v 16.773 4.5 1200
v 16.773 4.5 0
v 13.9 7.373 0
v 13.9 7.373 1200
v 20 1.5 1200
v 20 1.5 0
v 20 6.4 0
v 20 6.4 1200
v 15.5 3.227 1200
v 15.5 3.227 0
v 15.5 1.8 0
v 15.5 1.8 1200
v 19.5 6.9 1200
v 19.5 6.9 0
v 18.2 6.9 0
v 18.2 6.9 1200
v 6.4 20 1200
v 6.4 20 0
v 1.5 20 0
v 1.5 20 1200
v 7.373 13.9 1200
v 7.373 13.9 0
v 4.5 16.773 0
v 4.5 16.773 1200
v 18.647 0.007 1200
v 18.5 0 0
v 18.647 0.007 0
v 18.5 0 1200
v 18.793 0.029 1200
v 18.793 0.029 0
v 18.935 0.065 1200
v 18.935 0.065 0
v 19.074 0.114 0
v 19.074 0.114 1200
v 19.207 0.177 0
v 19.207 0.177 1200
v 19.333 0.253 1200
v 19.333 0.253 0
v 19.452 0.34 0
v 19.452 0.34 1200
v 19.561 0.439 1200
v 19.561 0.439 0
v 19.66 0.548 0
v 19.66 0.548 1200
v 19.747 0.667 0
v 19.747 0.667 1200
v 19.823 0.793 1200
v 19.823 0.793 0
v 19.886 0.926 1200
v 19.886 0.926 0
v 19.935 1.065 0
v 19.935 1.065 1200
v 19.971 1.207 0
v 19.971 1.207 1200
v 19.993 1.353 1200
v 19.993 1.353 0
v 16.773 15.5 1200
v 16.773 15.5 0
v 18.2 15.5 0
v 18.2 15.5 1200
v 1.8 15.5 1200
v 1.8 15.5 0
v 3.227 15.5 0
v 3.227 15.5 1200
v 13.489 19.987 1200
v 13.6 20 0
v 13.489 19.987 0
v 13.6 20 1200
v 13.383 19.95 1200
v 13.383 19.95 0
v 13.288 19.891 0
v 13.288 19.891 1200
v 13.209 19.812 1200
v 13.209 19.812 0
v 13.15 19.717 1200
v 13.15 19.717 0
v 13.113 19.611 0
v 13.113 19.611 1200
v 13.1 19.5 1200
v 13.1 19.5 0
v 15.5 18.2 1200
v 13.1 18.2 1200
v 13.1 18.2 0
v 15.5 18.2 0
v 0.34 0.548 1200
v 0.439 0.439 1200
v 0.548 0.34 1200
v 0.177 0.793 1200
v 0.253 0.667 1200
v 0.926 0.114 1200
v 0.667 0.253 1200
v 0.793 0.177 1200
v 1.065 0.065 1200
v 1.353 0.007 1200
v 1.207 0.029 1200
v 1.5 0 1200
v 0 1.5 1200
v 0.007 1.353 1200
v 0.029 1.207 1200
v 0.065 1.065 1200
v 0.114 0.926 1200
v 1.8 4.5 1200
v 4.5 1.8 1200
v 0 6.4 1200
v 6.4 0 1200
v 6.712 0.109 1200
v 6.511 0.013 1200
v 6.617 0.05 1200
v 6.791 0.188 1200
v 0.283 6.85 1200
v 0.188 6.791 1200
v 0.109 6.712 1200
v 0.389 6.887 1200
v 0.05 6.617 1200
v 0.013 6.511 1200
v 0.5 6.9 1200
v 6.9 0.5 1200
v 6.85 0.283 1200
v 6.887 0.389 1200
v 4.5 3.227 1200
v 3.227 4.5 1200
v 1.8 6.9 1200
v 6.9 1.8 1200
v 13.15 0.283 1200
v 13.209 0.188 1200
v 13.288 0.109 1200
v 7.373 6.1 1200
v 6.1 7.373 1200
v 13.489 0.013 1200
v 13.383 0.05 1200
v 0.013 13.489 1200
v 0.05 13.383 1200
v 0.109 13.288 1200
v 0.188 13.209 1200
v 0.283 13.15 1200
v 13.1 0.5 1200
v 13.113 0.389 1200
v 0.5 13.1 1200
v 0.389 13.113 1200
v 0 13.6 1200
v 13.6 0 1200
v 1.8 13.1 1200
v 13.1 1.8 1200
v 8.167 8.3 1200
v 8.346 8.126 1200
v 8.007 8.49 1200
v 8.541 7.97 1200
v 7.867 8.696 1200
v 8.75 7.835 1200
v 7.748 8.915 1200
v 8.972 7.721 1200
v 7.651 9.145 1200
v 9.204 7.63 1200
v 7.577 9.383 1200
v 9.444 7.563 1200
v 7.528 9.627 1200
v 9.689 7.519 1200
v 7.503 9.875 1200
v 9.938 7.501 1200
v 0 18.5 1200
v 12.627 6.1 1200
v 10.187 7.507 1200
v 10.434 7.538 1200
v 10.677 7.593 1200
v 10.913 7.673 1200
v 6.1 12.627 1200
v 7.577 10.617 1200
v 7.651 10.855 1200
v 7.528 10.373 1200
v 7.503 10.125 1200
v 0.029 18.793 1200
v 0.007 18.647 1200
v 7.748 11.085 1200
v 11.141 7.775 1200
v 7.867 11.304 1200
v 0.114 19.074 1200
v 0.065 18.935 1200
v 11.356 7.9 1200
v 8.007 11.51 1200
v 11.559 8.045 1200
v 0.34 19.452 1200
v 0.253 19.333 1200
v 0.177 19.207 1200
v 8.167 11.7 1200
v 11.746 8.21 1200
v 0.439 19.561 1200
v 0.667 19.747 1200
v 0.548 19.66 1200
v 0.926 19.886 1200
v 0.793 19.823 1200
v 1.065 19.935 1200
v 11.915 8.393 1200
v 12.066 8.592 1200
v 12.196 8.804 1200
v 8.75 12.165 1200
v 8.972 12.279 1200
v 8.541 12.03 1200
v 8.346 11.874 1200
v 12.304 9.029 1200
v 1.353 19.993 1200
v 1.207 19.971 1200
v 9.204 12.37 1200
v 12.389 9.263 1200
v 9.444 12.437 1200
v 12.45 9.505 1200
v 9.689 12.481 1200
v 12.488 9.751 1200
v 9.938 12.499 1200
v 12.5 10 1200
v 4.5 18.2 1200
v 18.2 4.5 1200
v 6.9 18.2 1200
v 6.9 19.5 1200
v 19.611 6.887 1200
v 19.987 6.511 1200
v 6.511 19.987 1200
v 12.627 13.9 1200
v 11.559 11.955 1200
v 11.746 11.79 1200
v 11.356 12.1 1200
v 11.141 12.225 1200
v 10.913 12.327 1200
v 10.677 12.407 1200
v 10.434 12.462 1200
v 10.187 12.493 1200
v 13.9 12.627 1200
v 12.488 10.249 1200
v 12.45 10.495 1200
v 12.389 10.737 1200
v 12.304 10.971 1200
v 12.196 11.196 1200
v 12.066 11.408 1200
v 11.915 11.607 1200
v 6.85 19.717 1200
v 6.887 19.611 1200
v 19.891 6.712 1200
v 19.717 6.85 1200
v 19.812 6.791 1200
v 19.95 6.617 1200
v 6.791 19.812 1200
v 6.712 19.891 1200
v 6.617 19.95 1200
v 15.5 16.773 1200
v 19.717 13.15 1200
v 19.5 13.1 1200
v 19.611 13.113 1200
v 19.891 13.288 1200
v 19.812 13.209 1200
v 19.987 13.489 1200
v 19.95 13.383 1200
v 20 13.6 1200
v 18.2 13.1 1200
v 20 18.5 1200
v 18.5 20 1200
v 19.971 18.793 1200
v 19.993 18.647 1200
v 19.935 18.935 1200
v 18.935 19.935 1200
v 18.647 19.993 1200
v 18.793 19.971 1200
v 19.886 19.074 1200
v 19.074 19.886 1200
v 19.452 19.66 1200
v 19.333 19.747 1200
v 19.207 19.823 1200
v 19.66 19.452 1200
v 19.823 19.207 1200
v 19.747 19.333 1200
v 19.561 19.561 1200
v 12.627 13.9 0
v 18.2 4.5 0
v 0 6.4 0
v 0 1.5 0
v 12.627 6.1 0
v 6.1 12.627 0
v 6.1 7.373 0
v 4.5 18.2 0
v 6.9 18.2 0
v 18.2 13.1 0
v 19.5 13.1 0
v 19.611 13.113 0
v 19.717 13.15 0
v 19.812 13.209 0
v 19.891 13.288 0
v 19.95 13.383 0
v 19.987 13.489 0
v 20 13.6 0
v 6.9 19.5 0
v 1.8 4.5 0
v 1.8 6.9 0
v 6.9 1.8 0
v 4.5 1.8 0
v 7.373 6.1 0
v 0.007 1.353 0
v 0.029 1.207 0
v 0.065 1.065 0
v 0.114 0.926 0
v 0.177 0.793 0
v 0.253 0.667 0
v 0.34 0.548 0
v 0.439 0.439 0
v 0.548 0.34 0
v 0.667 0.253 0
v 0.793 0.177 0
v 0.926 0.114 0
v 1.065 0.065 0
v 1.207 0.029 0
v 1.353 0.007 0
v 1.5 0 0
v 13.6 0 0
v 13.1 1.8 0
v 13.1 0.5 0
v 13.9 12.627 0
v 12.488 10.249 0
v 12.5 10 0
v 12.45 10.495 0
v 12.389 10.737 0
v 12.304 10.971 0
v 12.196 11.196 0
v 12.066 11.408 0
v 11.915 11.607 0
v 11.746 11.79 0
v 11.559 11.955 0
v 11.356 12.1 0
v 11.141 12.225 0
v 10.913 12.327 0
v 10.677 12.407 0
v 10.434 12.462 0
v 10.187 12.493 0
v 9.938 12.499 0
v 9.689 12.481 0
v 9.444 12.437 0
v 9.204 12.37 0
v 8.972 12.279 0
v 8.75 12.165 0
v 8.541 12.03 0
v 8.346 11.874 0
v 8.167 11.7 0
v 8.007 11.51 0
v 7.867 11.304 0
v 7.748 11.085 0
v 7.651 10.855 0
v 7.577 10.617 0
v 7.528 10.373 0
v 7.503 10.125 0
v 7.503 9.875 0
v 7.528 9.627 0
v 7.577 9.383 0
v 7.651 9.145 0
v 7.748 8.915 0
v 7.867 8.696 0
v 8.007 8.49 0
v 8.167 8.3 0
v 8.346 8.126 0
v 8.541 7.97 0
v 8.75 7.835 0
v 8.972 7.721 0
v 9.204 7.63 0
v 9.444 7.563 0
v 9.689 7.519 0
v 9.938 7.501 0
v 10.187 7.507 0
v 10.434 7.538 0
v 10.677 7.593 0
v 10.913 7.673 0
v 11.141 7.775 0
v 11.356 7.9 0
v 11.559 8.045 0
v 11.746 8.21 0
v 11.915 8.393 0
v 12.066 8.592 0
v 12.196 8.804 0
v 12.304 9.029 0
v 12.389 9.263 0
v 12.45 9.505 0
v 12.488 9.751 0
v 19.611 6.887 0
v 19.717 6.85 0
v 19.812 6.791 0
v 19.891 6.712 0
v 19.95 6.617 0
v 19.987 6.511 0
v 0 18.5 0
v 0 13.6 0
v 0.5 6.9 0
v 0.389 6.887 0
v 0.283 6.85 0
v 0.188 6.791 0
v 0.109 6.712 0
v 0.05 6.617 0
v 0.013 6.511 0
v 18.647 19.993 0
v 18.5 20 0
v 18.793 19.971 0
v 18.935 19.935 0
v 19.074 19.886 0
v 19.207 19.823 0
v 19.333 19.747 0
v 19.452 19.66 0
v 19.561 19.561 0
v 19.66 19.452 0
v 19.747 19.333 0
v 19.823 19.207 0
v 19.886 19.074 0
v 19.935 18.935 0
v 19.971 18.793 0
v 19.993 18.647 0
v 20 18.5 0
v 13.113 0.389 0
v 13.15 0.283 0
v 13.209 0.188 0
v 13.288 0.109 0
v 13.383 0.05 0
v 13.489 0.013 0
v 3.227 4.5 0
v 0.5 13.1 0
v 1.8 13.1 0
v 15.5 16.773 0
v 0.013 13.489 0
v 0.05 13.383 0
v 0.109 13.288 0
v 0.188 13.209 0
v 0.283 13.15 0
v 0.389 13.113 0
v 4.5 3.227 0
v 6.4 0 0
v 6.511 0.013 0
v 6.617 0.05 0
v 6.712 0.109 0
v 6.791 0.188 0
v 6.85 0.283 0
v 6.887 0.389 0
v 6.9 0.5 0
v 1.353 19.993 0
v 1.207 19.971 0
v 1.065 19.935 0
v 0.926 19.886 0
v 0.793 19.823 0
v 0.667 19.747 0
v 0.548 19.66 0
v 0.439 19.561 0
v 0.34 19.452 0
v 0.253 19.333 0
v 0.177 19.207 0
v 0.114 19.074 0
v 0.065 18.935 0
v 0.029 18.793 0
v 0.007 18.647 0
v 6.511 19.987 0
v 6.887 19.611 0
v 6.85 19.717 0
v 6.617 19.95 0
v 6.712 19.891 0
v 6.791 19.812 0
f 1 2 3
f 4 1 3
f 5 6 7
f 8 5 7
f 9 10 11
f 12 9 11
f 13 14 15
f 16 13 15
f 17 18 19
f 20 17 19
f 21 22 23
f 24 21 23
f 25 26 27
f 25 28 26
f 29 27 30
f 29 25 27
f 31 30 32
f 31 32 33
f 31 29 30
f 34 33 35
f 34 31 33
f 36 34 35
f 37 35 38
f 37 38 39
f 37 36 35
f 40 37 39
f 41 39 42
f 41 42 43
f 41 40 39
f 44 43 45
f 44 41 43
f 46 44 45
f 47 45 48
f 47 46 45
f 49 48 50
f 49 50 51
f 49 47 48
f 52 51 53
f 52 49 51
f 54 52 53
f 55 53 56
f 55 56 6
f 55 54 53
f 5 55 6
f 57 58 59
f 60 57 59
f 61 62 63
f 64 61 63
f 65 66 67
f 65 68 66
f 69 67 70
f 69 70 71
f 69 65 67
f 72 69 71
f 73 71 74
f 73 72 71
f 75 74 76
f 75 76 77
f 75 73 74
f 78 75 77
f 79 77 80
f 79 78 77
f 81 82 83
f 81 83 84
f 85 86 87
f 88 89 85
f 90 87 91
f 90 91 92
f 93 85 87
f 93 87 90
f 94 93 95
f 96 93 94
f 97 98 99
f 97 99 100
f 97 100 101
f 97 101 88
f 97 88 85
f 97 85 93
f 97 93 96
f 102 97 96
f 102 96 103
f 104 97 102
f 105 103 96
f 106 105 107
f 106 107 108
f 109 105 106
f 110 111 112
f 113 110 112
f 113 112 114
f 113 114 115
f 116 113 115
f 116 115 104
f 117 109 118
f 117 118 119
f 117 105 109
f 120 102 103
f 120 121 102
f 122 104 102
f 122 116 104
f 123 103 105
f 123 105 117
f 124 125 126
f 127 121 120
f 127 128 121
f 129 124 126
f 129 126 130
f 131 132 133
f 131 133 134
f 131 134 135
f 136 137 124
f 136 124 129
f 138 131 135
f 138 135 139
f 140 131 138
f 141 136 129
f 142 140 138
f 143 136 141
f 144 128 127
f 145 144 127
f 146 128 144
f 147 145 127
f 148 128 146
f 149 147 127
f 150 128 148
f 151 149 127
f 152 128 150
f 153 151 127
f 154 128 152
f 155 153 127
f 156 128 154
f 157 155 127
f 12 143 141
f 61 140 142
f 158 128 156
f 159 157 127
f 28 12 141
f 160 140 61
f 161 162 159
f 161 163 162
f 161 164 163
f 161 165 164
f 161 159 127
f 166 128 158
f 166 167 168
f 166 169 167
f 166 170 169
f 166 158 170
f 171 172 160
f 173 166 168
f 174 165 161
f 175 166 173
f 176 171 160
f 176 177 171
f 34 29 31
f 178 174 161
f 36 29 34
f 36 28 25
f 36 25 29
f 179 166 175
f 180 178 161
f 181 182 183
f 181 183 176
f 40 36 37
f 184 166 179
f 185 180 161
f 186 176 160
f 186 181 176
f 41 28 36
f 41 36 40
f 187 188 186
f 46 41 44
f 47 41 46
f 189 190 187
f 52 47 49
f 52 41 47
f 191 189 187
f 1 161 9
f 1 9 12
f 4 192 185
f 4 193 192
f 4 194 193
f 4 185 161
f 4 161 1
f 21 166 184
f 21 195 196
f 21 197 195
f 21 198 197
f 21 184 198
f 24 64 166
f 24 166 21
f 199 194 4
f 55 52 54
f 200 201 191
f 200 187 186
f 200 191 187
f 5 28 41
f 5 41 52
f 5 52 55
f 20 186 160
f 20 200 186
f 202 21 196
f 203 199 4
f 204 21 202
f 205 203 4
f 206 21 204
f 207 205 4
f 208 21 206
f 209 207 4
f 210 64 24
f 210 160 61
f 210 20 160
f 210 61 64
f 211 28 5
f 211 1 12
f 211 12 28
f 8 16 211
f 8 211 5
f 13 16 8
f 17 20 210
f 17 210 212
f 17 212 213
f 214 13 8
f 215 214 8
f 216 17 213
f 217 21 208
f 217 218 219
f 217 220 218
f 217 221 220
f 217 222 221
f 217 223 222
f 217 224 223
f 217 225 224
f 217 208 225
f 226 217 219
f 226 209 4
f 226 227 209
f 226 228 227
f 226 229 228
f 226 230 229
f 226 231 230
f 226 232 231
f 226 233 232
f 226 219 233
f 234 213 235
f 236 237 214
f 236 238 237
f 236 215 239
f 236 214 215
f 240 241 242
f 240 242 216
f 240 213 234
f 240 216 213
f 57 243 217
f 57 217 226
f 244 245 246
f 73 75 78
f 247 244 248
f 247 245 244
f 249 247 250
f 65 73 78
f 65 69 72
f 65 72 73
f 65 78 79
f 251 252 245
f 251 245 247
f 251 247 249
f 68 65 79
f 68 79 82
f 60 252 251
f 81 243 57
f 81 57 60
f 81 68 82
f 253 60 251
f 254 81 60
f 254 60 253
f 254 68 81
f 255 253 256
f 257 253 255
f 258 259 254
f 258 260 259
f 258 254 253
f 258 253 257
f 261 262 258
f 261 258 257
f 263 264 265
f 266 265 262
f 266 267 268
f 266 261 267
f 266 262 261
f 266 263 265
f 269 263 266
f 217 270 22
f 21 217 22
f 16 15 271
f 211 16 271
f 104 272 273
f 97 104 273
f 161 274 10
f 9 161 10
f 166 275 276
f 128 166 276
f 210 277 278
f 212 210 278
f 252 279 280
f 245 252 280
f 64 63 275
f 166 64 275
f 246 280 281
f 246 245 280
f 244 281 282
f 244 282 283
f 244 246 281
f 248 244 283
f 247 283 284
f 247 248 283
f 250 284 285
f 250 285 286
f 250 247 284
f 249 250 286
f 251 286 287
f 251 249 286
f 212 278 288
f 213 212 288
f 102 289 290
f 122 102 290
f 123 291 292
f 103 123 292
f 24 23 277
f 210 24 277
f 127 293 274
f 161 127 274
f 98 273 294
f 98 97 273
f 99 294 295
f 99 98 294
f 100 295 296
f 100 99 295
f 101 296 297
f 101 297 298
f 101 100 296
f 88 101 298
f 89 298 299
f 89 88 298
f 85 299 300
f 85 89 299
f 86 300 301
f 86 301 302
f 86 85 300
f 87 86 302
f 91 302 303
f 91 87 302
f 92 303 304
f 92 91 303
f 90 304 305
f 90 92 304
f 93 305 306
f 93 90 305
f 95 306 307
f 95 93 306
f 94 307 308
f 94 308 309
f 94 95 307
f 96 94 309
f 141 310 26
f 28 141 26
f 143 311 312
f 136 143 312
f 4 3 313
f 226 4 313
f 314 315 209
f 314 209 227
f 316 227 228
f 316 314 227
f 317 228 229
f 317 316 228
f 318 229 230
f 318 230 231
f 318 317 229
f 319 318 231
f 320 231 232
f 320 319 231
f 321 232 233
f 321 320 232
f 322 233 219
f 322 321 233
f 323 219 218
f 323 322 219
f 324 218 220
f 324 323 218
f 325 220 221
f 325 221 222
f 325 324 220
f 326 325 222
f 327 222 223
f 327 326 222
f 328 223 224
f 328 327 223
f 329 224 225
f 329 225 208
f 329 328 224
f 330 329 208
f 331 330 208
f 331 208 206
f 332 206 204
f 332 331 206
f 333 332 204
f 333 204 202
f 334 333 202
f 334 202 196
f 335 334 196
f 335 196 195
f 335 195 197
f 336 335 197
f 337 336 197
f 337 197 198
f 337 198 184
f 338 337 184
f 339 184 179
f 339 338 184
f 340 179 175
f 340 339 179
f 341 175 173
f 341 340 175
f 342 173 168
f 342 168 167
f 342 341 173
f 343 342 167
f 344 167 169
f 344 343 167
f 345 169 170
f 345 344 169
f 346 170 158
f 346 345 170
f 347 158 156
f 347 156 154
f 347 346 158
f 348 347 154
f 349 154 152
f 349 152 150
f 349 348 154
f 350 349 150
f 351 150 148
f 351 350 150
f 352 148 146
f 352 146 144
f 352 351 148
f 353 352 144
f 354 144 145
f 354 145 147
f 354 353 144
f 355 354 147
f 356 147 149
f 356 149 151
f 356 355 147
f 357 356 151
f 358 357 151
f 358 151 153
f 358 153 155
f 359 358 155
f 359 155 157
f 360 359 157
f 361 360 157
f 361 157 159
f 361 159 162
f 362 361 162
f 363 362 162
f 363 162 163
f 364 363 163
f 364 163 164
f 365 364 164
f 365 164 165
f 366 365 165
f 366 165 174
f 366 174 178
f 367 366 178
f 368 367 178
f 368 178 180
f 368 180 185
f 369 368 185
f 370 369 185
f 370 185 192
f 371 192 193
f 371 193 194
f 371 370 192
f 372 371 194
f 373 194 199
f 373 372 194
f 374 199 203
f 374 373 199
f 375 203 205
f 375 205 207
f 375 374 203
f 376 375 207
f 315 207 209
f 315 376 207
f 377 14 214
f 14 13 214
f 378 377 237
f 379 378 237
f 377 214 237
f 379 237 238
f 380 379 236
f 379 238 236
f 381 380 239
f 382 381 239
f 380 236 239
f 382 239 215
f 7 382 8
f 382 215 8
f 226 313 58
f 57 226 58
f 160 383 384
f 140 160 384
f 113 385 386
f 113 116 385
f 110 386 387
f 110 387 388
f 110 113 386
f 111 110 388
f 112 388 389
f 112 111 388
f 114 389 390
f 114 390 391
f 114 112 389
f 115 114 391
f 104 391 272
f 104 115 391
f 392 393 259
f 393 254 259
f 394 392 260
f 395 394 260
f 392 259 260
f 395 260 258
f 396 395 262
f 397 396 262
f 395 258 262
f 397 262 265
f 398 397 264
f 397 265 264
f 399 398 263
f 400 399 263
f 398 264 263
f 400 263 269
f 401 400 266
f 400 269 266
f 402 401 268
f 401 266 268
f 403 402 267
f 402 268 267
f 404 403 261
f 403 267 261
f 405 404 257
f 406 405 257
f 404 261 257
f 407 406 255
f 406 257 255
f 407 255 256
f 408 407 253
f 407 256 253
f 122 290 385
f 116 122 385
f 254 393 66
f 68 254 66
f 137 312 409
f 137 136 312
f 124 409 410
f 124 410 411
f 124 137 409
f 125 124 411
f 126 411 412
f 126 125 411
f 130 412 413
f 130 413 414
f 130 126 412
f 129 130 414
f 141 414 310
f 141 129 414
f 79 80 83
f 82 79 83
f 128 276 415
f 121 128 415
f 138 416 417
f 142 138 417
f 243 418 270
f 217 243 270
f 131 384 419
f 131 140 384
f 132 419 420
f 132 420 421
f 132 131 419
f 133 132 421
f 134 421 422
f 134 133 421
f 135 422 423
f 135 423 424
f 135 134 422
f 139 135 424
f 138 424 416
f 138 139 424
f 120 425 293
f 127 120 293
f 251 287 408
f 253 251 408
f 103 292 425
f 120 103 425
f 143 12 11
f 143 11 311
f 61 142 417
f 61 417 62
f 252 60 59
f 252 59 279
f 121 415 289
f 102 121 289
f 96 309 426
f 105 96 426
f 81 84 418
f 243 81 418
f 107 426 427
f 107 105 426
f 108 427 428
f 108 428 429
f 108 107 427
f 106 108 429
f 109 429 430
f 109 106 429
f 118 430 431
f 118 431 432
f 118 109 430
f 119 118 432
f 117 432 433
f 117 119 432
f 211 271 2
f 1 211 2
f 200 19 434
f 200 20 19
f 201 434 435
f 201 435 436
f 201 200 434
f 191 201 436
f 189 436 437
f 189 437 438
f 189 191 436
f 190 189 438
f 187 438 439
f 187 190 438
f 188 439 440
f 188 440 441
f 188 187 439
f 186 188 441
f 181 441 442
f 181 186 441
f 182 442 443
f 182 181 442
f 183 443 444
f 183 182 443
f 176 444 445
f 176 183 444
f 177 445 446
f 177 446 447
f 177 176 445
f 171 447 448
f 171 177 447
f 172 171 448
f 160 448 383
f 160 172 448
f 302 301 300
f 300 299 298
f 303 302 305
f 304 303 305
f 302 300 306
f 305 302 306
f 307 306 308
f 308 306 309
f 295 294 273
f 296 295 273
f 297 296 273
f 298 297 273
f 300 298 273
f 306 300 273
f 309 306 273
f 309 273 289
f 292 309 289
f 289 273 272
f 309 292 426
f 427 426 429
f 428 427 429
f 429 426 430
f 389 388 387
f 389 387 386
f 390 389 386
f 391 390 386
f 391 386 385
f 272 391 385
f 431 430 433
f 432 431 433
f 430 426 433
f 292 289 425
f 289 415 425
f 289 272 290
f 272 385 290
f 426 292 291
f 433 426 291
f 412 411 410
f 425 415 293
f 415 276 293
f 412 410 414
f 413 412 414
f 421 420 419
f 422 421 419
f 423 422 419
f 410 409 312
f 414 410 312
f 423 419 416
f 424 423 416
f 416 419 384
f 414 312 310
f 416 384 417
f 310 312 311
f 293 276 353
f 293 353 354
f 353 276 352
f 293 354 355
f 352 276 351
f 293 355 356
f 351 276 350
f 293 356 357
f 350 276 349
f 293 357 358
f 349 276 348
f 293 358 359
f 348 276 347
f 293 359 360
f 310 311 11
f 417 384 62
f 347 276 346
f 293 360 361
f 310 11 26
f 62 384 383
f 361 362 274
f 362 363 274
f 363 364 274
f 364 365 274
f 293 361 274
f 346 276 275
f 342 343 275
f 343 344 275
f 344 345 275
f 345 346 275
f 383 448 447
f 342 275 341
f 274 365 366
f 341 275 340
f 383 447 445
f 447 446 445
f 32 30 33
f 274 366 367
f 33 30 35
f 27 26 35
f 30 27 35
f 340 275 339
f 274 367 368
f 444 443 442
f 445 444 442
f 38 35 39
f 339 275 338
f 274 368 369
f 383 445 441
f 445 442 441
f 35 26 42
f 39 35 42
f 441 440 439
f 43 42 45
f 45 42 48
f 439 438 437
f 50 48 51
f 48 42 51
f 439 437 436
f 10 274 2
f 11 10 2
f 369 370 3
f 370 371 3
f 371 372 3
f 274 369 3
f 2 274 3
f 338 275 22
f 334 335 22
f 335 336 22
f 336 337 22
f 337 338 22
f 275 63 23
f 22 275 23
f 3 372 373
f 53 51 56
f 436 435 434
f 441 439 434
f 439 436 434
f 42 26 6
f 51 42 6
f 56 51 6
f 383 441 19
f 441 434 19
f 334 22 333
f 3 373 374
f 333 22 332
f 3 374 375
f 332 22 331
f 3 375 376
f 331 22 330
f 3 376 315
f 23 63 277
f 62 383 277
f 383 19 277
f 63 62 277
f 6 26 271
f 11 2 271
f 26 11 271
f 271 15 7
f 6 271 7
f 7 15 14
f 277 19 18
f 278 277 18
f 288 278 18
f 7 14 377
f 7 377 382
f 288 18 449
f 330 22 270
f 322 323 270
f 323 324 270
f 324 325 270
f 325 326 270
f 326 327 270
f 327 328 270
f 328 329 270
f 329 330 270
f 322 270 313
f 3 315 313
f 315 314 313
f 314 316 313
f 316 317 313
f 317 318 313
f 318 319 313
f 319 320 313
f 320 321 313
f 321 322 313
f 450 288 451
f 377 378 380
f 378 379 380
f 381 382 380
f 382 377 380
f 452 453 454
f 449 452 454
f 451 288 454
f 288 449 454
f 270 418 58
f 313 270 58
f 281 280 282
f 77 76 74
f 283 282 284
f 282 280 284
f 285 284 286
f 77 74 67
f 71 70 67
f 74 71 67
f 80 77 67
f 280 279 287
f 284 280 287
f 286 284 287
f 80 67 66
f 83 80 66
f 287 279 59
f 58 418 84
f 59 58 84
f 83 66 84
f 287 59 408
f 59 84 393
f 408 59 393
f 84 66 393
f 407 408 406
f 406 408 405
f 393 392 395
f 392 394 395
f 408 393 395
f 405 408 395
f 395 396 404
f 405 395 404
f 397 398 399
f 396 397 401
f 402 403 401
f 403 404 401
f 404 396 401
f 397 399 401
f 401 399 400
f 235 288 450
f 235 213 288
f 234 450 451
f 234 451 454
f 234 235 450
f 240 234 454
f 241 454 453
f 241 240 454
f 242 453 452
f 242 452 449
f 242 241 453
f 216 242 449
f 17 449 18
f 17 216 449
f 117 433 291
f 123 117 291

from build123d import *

# Parameters (mm, degrees)
SKETCH_1_R      = 2.5
EXTRUDE_1_DEPTH = 1200
FILLET_1_R      = 1.5
FILLET_2_R      = 1.5
FILLET_3_R      = 1.5
FILLET_4_R      = 1.5
FILLET_5_R      = 0.5
FILLET_6_R      = 0.5
FILLET_7_R      = 0.5
FILLET_8_R      = 0.5
FILLET_9_R      = 0.5
FILLET_10_R     = 0.5
FILLET_11_R     = 0.5
FILLET_12_R     = 0.5


with BuildPart() as part:
    # 草图1 → 凸台-拉伸1 (new body)
    with BuildSketch(Plane.XY):
        Polygon((0, 6.9), (0, 0), (6.9, 0), (6.9, 1.8), (4.5, 1.8), (4.5, 3.227207794), (7.372792206, 6.1), (12.627207794, 6.1), (15.5, 3.227207794), (15.5, 1.8), (13.1, 1.8), (13.1, 0), (20, 0), (20, 6.9), (18.2, 6.9), (18.2, 4.5), (16.772792206, 4.5), (13.9, 7.372792206), (13.9, 12.627207794), (16.772792206, 15.5), (18.2, 15.5), (18.2, 13.1), (20, 13.1), (20, 20), (13.1, 20), (13.1, 18.2), (15.5, 18.2), (15.5, 16.772792206), (12.627207794, 13.9), (7.372792206, 13.9), (4.5, 16.772792206), (4.5, 18.2), (6.9, 18.2), (6.9, 20), (0, 20), (0, 13.1), (1.8, 13.1), (1.8, 15.5), (3.227207794, 15.5), (6.1, 12.627207794), (6.1, 7.372792206), (3.227207794, 4.5), (1.8, 4.5), (1.8, 6.9), align=None)
        with Locations((10, 10)):
            Circle(SKETCH_1_R, mode=Mode.SUBTRACT)
    extrude(amount=EXTRUDE_1_DEPTH)

    # 圆角1
    fillet_1_edges = [part.edges().sort_by_distance(p)[0] for p in [
        (20, 20, 600),
    ]]
    fillet(fillet_1_edges, radius=FILLET_1_R)

    # 圆角2
    fillet_2_edges = [part.edges().sort_by_distance(p)[0] for p in [
        (0, 20, 600),
    ]]
    fillet(fillet_2_edges, radius=FILLET_2_R)

    # 圆角3
    fillet_3_edges = [part.edges().sort_by_distance(p)[0] for p in [
        (0, 0, 600),
    ]]
    fillet(fillet_3_edges, radius=FILLET_3_R)

    # 圆角4
    fillet_4_edges = [part.edges().sort_by_distance(p)[0] for p in [
        (20, 0, 600),
    ]]
    fillet(fillet_4_edges, radius=FILLET_4_R)

    # 圆角5
    fillet_5_edges = [part.edges().sort_by_distance(p)[0] for p in [
        (13.1, 20, 600),
    ]]
    fillet(fillet_5_edges, radius=FILLET_5_R)

    # 圆角6
    fillet_6_edges = [part.edges().sort_by_distance(p)[0] for p in [
        (6.9, 20, 600),
    ]]
    fillet(fillet_6_edges, radius=FILLET_6_R)

    # 圆角7
    fillet_7_edges = [part.edges().sort_by_distance(p)[0] for p in [
        (0, 13.1, 600),
    ]]
    fillet(fillet_7_edges, radius=FILLET_7_R)

    # 圆角8
    fillet_8_edges = [part.edges().sort_by_distance(p)[0] for p in [
        (0, 6.9, 600),
    ]]
    fillet(fillet_8_edges, radius=FILLET_8_R)

    # 圆角9
    fillet_9_edges = [part.edges().sort_by_distance(p)[0] for p in [
        (6.9, 0, 600),
    ]]
    fillet(fillet_9_edges, radius=FILLET_9_R)

    # 圆角10
    fillet_10_edges = [part.edges().sort_by_distance(p)[0] for p in [
        (13.1, 0, 600),
    ]]
    fillet(fillet_10_edges, radius=FILLET_10_R)

    # 圆角11
    fillet_11_edges = [part.edges().sort_by_distance(p)[0] for p in [
        (20, 13.1, 600),
    ]]
    fillet(fillet_11_edges, radius=FILLET_11_R)

    # 圆角12
    fillet_12_edges = [part.edges().sort_by_distance(p)[0] for p in [
        (20, 6.9, 600),
    ]]
    fillet(fillet_12_edges, radius=FILLET_12_R)


solid = part.part
